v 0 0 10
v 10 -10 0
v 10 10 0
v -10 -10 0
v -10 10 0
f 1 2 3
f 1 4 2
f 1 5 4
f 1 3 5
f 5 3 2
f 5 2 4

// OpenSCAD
polyhedron(
  points=[ [10,10,0],[10,-10,0],[-10,-10,0],[-10,10,0], // the four points at base
           [0,0,10]  ],                                 // the apex point 
  triangles=[ [0,1,4],[1,2,4],[2,3,4],[3,0,4],          // each triangle side
              [1,0,3],[2,1,3] ]                         // two triangles for square base
 );
